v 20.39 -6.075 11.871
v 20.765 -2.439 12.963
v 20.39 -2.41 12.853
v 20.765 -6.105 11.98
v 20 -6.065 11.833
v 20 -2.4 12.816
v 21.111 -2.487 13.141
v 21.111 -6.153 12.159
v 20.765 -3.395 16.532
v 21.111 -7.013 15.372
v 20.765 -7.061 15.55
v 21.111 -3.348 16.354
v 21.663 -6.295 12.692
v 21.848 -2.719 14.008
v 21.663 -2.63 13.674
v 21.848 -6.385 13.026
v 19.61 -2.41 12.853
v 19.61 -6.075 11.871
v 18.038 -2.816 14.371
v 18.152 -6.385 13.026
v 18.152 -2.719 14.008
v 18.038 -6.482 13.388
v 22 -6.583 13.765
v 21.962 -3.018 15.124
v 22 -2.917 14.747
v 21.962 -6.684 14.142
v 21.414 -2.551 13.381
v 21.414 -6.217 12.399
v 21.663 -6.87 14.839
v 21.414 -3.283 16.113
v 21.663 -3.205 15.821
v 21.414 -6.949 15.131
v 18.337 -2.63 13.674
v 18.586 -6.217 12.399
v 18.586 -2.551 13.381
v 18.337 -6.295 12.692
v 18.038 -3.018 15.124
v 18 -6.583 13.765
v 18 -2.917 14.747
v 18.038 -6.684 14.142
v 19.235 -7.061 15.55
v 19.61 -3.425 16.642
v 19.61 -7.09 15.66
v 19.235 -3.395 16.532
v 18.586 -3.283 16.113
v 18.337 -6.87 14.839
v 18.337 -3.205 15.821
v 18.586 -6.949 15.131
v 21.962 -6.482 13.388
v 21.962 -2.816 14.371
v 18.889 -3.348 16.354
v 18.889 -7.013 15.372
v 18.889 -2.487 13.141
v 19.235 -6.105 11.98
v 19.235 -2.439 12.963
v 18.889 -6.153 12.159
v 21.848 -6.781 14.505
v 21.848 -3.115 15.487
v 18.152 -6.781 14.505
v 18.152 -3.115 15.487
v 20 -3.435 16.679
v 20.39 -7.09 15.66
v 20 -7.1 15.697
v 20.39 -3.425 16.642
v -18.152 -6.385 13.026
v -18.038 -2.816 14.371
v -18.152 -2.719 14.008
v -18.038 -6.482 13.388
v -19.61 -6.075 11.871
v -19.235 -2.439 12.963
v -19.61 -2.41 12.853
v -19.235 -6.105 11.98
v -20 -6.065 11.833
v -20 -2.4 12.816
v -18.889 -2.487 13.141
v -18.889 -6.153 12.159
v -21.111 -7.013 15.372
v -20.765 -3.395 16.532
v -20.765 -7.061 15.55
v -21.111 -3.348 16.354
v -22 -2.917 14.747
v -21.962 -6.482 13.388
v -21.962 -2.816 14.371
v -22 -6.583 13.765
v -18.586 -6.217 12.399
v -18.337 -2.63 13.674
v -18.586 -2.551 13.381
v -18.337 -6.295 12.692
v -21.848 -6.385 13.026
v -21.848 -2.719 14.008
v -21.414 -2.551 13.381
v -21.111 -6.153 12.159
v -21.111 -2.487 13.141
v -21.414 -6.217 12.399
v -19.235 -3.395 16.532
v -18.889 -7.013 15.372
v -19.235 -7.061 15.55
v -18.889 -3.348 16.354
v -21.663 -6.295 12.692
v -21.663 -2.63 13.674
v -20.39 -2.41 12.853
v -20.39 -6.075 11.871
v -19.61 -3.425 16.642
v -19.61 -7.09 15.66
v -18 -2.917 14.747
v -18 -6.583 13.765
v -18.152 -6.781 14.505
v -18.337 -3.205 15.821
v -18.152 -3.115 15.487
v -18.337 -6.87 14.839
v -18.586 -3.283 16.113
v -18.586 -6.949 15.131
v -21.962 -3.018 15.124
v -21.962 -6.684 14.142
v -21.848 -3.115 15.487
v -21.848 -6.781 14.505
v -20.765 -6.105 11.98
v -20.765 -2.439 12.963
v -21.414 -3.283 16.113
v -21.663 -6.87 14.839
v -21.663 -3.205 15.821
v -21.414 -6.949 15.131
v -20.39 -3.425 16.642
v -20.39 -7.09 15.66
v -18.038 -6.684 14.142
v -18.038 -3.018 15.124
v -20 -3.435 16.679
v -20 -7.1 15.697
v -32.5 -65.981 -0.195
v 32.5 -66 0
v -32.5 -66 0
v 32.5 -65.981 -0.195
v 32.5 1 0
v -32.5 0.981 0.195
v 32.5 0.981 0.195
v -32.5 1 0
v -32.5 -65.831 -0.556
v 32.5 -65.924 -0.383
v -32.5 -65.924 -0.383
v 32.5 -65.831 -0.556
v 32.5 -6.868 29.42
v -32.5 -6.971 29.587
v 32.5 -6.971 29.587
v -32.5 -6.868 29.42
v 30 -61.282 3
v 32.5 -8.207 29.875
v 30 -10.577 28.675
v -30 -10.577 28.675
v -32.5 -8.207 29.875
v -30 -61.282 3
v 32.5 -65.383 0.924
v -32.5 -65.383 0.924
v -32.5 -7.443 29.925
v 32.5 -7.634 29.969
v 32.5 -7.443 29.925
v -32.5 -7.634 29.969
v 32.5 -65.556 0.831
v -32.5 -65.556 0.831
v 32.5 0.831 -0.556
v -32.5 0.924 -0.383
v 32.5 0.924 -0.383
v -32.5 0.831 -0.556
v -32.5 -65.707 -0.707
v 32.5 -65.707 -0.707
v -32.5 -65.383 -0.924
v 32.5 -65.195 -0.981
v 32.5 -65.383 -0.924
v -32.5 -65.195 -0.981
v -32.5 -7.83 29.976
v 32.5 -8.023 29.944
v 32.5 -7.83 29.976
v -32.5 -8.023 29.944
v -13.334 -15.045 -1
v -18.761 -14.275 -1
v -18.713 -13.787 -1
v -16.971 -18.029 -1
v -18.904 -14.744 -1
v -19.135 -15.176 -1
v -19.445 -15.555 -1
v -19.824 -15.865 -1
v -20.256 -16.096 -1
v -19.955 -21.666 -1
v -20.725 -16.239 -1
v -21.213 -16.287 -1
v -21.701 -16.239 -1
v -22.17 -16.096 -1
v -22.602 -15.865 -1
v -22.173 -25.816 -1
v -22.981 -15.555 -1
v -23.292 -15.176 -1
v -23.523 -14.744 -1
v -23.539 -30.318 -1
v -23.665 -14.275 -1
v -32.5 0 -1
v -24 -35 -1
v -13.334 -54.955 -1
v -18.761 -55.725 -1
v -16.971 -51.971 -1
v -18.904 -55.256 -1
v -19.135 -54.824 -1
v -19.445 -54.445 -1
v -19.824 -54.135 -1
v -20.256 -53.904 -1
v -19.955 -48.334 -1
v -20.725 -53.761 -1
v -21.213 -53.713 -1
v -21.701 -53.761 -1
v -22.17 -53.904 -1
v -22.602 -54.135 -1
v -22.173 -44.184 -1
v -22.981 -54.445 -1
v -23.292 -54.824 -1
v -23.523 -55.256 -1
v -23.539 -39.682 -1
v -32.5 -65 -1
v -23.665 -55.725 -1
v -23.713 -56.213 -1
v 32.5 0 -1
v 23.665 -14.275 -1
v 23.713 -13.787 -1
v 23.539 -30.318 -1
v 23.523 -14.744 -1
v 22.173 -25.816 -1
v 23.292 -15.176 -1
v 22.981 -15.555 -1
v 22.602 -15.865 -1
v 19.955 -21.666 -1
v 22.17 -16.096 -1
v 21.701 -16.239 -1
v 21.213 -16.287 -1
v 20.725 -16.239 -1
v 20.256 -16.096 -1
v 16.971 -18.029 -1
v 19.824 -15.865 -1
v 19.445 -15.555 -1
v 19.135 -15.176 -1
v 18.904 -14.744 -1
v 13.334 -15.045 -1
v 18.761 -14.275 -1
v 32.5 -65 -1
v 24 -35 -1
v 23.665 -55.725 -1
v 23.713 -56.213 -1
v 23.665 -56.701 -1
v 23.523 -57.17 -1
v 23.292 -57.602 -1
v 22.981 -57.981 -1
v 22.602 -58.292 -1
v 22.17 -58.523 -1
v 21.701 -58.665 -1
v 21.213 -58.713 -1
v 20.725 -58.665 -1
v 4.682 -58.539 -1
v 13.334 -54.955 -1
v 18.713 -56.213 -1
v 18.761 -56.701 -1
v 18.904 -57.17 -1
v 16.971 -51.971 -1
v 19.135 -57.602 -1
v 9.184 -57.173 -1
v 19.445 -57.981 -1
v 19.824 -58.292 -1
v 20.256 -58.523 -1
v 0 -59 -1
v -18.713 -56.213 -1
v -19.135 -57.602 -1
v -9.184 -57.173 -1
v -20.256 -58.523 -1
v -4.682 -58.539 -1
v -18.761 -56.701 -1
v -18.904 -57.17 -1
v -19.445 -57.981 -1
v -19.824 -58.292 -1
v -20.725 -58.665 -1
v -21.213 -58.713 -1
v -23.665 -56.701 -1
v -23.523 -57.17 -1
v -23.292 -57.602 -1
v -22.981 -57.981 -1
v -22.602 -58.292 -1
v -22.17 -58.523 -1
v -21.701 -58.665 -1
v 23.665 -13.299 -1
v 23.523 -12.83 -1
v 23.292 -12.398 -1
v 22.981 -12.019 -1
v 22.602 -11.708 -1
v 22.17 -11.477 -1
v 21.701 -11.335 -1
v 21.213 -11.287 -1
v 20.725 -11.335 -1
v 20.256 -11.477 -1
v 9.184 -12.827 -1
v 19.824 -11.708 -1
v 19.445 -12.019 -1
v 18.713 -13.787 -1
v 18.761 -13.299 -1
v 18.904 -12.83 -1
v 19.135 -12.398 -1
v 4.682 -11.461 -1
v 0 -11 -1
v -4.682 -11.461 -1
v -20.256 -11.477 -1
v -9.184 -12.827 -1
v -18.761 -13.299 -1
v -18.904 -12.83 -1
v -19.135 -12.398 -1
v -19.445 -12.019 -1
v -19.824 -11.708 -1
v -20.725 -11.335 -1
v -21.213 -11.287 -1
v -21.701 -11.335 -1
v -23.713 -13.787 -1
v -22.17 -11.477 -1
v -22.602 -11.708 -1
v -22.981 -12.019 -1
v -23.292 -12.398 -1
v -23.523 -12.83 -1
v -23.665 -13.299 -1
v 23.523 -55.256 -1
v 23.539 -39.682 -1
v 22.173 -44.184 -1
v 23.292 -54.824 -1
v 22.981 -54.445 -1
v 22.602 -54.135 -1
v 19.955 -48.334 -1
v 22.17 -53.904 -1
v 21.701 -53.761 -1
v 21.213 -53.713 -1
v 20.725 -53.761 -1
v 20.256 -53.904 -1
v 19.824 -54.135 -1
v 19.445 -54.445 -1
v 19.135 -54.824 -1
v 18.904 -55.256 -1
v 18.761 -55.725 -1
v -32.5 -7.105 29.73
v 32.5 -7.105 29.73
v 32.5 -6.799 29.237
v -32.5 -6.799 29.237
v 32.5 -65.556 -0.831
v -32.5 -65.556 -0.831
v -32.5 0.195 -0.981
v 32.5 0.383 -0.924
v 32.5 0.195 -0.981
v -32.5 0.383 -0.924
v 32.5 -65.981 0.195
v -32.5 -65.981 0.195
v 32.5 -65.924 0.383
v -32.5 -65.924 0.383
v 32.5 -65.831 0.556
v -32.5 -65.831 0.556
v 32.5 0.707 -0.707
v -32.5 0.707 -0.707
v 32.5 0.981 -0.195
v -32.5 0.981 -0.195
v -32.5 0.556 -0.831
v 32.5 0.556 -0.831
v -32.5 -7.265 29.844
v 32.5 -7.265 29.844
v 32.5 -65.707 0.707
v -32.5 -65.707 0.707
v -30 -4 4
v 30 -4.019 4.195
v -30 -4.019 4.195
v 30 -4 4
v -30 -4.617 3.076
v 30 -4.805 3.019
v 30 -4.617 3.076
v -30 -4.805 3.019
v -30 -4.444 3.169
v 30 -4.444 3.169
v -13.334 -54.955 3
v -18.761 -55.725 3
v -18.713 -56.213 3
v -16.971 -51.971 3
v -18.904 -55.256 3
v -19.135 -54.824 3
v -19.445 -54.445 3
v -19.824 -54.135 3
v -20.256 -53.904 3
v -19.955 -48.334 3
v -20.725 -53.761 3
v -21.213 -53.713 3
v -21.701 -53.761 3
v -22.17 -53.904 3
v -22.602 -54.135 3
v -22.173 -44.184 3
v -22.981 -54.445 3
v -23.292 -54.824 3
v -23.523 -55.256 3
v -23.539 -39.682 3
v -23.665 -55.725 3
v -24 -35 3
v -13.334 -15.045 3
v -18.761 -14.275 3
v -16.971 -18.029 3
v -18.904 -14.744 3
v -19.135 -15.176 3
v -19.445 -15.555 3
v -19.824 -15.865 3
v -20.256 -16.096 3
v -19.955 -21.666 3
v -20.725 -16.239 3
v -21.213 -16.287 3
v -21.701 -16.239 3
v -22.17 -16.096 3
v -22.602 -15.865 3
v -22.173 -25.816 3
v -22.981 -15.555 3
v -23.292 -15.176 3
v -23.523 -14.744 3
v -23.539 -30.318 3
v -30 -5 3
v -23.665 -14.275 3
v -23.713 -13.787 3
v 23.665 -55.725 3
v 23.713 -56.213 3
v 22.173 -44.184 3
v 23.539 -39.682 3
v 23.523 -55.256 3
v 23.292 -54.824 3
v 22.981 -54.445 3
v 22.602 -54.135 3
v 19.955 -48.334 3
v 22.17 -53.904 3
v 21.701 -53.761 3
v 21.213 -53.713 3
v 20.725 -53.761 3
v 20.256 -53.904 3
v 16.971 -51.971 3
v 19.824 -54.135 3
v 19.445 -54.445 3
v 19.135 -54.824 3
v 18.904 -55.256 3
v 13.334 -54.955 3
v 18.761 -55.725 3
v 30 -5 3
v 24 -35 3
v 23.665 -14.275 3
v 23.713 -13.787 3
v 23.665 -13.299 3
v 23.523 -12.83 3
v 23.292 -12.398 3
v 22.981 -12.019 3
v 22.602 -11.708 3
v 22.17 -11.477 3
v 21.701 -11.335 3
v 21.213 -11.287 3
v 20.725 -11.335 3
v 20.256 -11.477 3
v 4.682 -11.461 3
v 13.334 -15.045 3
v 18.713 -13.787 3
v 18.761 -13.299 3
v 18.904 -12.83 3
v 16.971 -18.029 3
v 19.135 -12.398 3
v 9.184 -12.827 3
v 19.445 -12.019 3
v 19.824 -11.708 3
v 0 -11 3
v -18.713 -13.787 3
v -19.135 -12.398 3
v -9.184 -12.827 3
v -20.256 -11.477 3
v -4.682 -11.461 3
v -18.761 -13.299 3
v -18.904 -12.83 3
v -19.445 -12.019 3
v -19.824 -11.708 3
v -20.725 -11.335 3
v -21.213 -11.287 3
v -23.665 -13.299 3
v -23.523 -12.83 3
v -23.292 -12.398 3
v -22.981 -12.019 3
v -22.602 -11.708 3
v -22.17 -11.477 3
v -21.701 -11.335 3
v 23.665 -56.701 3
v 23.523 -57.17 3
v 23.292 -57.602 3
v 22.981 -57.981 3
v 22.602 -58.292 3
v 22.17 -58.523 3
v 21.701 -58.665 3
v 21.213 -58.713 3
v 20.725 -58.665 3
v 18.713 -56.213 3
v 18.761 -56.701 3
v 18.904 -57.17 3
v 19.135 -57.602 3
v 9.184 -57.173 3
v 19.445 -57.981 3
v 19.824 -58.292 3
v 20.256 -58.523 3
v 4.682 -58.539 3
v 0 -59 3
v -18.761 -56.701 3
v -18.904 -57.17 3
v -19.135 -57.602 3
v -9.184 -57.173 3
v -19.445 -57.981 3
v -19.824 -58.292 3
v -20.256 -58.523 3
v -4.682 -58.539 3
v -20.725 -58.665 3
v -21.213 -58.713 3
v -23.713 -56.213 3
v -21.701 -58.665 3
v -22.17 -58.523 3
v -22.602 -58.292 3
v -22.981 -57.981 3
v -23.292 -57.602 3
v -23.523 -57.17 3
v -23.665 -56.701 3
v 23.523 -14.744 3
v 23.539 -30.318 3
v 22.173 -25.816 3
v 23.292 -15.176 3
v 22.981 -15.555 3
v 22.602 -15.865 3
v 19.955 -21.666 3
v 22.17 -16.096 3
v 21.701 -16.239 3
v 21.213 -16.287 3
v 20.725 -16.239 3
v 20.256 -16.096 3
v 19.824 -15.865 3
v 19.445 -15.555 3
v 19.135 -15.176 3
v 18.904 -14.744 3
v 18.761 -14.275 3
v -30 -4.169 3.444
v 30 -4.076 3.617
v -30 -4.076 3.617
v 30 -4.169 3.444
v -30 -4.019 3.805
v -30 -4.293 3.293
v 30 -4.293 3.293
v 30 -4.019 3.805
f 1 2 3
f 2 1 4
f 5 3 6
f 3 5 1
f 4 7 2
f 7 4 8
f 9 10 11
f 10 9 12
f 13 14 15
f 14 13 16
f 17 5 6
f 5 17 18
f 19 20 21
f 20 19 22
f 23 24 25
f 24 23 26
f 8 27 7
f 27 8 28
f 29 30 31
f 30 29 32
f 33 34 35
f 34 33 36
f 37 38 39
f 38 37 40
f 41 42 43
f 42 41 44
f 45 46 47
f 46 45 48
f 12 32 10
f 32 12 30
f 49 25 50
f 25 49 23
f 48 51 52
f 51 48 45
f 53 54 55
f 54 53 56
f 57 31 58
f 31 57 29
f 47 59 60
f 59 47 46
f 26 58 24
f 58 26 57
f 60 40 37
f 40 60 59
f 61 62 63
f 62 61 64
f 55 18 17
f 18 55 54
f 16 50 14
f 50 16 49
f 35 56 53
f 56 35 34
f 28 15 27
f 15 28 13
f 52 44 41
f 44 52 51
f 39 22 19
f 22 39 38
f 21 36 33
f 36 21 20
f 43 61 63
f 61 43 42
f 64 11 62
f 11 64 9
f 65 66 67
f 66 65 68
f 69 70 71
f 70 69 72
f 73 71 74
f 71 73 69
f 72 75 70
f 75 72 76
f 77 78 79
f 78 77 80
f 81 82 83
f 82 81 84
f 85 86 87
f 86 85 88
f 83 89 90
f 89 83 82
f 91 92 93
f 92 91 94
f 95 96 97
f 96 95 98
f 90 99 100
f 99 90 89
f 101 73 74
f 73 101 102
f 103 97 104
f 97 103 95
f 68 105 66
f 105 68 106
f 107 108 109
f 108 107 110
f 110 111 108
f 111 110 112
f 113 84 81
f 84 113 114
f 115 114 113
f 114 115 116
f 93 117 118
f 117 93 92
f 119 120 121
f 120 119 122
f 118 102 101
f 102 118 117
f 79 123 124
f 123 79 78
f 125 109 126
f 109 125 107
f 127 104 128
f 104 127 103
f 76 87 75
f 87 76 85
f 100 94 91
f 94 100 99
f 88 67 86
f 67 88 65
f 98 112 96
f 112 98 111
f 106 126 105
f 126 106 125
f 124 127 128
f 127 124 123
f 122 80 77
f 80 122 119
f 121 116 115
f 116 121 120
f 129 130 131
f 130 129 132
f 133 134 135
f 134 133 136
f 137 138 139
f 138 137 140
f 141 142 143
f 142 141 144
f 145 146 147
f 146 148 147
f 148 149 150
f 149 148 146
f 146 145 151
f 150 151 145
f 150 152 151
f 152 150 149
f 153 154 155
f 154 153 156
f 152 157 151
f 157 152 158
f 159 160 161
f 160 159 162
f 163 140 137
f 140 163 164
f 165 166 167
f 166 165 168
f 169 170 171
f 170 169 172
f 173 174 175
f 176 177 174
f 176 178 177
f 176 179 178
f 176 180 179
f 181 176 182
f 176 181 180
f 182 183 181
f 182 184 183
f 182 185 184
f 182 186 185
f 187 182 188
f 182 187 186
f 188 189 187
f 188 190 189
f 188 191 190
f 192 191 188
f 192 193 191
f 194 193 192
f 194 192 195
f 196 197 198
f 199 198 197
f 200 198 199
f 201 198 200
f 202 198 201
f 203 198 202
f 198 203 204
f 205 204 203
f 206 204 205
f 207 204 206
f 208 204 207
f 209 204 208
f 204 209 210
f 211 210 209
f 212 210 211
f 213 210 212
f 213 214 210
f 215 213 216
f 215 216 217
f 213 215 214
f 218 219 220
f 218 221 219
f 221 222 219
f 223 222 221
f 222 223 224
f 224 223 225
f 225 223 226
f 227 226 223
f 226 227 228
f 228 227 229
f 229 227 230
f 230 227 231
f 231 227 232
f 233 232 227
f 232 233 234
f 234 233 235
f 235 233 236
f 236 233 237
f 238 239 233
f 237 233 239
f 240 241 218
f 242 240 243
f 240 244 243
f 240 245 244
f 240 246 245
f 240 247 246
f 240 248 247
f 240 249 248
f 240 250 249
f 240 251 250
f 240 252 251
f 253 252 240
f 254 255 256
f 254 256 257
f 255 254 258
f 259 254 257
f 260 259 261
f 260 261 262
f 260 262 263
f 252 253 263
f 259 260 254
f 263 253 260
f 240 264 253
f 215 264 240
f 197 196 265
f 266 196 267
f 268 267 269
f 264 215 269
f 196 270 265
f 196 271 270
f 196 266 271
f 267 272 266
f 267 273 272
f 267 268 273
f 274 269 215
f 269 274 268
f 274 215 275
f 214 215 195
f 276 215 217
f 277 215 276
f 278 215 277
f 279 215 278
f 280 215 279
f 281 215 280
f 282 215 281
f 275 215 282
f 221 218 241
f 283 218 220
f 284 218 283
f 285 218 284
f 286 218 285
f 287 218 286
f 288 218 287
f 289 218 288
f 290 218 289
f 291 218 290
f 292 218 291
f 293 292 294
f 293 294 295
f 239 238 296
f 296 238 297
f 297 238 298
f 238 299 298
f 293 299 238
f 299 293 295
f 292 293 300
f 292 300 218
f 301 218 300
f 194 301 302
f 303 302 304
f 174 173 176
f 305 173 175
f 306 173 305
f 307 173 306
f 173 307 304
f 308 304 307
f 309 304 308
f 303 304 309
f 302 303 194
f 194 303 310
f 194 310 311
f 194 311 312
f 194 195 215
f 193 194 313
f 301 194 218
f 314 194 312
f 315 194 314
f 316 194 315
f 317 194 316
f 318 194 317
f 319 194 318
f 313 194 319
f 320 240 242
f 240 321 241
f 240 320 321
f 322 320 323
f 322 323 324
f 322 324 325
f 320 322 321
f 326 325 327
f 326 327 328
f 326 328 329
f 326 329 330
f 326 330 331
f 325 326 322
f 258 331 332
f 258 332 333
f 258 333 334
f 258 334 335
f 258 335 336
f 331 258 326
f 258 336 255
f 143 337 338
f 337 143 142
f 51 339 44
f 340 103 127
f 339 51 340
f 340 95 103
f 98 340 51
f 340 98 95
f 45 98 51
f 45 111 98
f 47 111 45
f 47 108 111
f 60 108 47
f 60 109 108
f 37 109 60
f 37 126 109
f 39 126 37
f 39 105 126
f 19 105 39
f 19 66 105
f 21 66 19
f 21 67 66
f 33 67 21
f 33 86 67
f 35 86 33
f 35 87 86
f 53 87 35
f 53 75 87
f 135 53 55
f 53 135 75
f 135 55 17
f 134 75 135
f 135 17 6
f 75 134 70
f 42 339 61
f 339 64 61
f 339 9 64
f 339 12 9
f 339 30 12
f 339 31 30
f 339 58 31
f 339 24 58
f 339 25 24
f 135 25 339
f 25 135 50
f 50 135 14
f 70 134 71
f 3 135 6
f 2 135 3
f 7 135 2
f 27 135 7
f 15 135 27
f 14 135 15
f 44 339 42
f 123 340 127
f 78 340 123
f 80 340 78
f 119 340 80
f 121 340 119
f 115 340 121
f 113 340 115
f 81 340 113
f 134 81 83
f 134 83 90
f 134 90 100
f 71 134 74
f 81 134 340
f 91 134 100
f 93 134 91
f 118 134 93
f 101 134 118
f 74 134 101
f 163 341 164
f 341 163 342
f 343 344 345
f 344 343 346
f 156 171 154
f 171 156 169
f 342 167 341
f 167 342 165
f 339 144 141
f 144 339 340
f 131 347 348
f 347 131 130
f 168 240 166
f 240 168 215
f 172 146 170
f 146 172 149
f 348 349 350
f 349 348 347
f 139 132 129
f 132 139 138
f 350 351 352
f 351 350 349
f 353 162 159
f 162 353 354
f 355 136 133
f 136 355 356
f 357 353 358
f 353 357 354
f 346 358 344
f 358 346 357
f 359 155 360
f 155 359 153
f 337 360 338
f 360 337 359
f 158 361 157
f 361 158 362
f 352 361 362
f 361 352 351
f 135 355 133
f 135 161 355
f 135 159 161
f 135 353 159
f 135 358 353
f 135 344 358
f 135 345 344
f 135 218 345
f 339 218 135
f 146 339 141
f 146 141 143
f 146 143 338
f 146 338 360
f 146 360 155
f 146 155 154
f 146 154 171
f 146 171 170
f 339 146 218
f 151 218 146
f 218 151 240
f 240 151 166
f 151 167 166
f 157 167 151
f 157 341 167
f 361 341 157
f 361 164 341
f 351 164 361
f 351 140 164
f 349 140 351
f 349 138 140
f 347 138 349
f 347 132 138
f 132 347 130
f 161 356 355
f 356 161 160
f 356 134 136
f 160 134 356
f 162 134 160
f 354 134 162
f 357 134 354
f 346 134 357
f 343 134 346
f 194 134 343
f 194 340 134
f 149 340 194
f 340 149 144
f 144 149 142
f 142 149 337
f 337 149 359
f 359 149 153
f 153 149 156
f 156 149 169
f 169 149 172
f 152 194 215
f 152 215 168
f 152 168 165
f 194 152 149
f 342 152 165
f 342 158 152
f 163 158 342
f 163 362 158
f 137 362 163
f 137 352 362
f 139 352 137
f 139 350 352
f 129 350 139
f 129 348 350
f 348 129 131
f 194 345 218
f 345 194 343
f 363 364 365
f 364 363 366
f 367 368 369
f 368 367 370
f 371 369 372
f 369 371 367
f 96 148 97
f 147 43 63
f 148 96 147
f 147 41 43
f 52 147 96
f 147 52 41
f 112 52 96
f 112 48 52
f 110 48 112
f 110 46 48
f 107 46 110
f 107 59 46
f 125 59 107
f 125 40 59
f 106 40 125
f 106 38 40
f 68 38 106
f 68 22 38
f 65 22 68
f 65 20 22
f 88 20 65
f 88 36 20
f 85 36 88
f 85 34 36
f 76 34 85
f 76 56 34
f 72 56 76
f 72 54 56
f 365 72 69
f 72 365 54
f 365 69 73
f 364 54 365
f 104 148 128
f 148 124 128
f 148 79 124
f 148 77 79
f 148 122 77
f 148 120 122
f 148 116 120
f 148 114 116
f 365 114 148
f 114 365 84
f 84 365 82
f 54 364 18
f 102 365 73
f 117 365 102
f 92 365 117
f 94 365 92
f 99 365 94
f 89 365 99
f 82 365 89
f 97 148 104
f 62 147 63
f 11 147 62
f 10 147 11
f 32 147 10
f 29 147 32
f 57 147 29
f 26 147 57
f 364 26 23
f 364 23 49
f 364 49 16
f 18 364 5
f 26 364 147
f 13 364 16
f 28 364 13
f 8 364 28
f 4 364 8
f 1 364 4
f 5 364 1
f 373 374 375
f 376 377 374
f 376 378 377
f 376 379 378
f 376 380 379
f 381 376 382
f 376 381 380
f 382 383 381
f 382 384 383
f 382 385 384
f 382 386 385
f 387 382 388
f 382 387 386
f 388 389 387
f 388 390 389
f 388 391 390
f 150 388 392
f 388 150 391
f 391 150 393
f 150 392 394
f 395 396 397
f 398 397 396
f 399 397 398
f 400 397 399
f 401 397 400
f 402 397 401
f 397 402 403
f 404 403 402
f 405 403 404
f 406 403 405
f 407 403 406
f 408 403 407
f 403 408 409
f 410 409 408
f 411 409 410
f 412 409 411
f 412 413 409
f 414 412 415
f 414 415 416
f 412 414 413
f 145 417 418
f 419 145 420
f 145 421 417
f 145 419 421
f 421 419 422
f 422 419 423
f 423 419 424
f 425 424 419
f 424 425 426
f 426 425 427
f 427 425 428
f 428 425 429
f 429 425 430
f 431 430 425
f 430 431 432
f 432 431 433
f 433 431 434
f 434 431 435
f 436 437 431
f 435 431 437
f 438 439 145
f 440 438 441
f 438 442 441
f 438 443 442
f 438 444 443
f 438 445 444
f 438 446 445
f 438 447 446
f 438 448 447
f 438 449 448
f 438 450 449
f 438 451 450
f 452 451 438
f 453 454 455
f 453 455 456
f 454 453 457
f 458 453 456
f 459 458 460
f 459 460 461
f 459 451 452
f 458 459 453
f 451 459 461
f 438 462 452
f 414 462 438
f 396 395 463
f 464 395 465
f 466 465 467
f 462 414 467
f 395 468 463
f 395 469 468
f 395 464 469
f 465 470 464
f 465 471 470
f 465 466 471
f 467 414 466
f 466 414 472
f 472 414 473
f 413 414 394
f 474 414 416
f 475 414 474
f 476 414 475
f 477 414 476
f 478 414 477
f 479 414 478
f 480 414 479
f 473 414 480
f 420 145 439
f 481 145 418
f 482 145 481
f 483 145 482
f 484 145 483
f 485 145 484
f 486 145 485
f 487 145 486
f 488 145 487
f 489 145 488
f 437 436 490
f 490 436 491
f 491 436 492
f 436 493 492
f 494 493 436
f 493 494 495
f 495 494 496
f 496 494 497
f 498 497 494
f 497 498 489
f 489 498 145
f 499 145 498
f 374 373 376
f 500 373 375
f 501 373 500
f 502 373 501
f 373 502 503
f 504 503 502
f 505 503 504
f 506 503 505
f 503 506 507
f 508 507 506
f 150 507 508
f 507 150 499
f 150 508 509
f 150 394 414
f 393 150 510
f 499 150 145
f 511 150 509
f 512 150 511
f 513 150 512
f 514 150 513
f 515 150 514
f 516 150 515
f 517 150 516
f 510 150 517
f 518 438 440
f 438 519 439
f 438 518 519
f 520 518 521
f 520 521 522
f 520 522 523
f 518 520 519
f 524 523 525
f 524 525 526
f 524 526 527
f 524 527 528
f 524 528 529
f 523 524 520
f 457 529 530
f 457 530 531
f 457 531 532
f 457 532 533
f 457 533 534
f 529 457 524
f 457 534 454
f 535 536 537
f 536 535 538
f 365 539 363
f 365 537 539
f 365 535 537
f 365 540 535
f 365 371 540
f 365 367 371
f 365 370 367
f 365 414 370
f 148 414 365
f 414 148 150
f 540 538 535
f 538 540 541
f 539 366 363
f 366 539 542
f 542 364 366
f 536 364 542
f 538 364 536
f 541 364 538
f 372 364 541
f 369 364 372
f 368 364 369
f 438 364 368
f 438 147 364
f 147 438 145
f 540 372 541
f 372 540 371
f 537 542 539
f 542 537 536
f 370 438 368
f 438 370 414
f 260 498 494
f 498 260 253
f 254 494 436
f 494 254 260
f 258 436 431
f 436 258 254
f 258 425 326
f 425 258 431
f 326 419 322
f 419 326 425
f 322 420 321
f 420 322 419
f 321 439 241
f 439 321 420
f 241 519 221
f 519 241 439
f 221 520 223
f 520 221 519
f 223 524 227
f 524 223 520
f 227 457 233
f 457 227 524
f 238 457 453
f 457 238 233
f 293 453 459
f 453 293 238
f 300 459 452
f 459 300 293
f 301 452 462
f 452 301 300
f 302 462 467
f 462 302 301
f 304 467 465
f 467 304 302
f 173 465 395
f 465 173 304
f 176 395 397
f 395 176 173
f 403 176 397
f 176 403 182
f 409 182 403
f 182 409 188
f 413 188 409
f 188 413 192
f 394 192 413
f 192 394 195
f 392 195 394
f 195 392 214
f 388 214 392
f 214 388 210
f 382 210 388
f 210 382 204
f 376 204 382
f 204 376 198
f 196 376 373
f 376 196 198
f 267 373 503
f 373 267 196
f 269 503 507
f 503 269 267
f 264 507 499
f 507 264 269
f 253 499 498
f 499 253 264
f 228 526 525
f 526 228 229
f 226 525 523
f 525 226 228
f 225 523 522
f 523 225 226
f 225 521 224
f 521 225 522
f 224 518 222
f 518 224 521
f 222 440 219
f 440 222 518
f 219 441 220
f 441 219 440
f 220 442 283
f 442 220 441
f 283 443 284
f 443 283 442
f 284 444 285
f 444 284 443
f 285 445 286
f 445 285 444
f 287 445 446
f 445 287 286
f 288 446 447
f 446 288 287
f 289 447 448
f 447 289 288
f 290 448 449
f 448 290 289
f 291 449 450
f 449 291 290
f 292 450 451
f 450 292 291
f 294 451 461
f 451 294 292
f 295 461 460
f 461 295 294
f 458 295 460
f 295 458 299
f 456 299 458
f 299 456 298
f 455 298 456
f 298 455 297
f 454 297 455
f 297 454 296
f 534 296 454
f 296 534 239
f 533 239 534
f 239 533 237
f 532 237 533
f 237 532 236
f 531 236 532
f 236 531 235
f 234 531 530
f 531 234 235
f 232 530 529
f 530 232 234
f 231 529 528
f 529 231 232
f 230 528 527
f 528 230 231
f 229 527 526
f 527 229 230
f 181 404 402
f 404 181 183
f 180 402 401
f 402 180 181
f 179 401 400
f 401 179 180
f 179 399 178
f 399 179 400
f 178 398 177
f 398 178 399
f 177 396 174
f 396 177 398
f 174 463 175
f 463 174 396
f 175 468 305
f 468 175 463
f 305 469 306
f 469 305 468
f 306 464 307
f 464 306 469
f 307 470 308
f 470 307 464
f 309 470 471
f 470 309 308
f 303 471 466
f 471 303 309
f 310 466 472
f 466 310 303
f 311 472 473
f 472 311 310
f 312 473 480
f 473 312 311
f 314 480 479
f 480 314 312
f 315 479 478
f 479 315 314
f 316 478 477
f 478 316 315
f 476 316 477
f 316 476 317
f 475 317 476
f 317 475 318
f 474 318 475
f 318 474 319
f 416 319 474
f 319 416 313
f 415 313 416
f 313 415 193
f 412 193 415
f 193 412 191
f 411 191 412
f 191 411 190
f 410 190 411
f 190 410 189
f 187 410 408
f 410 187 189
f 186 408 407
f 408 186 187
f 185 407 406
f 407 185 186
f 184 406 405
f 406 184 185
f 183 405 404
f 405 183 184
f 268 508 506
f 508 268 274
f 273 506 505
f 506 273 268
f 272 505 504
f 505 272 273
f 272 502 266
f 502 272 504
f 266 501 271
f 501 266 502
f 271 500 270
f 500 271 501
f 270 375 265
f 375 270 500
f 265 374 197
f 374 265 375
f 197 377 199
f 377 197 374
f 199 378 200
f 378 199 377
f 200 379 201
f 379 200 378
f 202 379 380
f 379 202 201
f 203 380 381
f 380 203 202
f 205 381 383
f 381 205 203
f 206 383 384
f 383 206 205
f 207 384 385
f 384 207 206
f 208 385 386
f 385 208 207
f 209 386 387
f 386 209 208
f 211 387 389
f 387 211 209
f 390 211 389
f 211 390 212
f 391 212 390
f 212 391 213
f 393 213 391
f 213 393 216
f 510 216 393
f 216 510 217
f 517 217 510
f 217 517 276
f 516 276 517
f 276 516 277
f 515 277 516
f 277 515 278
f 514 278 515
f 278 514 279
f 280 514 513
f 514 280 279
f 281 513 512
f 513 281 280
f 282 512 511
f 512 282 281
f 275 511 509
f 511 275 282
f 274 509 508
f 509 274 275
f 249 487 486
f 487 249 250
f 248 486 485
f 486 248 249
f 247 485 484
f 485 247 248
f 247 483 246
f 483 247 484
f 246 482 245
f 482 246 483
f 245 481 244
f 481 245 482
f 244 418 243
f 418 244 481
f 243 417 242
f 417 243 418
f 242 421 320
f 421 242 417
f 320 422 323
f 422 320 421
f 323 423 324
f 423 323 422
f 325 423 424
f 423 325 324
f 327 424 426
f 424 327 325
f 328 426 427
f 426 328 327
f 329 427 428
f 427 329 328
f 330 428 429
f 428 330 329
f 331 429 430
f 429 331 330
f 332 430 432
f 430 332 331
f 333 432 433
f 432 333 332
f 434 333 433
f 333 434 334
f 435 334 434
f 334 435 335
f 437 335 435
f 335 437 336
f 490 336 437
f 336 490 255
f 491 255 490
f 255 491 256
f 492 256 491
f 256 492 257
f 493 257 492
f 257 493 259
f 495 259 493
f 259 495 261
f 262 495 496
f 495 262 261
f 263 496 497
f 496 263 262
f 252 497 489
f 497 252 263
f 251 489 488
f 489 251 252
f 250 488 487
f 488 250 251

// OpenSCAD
$fn = 32;

module MountTriangle(base, length, angle)
{
  linear_extrude(base, center=true)
  {
    hull()
    {
      circle(r=1);

      translate([base, 0, 0])
      {
        circle(r=1);
      }

      rotate([0, 0, -angle])
      {
        translate([0, length, 0])
        {
          circle(r=1);
        }
      }
    }
  }
}

module AngledMount(base, length, angle)
{
  difference()
  {
    MountTriangle(base, length, angle);

    translate([5, 4, 0])
    {
      MountTriangle(base - 5, length, angle);
    }

    rotate([0,0,  -90-angle])
    {
      for(x=[-20, 20])
      {
        translate([-length / 2, 0, x])
        {
          rotate([-90, 0, 0])
          {
            cylinder(h=10, d=4, center=true);
          }
        }
      }
    }
  }
}

module SpeakerCutout()
{
  circle(d=48);

  for(a=[45,135,225,315])
  {
    rotate([0, 0, a])
    {
      translate([30, 0])
      {
        circle(d=5);
      }
    }
  }
}

difference()
{
  rotate([0, -90, 0])
  {
    rotate([0, 0, -90])
    {
      AngledMount(65, 30, 15);
    }
  }

  translate([0, -35, -5])
  {
    linear_extrude(10)
    {
      SpeakerCutout();
    }
  }
}
